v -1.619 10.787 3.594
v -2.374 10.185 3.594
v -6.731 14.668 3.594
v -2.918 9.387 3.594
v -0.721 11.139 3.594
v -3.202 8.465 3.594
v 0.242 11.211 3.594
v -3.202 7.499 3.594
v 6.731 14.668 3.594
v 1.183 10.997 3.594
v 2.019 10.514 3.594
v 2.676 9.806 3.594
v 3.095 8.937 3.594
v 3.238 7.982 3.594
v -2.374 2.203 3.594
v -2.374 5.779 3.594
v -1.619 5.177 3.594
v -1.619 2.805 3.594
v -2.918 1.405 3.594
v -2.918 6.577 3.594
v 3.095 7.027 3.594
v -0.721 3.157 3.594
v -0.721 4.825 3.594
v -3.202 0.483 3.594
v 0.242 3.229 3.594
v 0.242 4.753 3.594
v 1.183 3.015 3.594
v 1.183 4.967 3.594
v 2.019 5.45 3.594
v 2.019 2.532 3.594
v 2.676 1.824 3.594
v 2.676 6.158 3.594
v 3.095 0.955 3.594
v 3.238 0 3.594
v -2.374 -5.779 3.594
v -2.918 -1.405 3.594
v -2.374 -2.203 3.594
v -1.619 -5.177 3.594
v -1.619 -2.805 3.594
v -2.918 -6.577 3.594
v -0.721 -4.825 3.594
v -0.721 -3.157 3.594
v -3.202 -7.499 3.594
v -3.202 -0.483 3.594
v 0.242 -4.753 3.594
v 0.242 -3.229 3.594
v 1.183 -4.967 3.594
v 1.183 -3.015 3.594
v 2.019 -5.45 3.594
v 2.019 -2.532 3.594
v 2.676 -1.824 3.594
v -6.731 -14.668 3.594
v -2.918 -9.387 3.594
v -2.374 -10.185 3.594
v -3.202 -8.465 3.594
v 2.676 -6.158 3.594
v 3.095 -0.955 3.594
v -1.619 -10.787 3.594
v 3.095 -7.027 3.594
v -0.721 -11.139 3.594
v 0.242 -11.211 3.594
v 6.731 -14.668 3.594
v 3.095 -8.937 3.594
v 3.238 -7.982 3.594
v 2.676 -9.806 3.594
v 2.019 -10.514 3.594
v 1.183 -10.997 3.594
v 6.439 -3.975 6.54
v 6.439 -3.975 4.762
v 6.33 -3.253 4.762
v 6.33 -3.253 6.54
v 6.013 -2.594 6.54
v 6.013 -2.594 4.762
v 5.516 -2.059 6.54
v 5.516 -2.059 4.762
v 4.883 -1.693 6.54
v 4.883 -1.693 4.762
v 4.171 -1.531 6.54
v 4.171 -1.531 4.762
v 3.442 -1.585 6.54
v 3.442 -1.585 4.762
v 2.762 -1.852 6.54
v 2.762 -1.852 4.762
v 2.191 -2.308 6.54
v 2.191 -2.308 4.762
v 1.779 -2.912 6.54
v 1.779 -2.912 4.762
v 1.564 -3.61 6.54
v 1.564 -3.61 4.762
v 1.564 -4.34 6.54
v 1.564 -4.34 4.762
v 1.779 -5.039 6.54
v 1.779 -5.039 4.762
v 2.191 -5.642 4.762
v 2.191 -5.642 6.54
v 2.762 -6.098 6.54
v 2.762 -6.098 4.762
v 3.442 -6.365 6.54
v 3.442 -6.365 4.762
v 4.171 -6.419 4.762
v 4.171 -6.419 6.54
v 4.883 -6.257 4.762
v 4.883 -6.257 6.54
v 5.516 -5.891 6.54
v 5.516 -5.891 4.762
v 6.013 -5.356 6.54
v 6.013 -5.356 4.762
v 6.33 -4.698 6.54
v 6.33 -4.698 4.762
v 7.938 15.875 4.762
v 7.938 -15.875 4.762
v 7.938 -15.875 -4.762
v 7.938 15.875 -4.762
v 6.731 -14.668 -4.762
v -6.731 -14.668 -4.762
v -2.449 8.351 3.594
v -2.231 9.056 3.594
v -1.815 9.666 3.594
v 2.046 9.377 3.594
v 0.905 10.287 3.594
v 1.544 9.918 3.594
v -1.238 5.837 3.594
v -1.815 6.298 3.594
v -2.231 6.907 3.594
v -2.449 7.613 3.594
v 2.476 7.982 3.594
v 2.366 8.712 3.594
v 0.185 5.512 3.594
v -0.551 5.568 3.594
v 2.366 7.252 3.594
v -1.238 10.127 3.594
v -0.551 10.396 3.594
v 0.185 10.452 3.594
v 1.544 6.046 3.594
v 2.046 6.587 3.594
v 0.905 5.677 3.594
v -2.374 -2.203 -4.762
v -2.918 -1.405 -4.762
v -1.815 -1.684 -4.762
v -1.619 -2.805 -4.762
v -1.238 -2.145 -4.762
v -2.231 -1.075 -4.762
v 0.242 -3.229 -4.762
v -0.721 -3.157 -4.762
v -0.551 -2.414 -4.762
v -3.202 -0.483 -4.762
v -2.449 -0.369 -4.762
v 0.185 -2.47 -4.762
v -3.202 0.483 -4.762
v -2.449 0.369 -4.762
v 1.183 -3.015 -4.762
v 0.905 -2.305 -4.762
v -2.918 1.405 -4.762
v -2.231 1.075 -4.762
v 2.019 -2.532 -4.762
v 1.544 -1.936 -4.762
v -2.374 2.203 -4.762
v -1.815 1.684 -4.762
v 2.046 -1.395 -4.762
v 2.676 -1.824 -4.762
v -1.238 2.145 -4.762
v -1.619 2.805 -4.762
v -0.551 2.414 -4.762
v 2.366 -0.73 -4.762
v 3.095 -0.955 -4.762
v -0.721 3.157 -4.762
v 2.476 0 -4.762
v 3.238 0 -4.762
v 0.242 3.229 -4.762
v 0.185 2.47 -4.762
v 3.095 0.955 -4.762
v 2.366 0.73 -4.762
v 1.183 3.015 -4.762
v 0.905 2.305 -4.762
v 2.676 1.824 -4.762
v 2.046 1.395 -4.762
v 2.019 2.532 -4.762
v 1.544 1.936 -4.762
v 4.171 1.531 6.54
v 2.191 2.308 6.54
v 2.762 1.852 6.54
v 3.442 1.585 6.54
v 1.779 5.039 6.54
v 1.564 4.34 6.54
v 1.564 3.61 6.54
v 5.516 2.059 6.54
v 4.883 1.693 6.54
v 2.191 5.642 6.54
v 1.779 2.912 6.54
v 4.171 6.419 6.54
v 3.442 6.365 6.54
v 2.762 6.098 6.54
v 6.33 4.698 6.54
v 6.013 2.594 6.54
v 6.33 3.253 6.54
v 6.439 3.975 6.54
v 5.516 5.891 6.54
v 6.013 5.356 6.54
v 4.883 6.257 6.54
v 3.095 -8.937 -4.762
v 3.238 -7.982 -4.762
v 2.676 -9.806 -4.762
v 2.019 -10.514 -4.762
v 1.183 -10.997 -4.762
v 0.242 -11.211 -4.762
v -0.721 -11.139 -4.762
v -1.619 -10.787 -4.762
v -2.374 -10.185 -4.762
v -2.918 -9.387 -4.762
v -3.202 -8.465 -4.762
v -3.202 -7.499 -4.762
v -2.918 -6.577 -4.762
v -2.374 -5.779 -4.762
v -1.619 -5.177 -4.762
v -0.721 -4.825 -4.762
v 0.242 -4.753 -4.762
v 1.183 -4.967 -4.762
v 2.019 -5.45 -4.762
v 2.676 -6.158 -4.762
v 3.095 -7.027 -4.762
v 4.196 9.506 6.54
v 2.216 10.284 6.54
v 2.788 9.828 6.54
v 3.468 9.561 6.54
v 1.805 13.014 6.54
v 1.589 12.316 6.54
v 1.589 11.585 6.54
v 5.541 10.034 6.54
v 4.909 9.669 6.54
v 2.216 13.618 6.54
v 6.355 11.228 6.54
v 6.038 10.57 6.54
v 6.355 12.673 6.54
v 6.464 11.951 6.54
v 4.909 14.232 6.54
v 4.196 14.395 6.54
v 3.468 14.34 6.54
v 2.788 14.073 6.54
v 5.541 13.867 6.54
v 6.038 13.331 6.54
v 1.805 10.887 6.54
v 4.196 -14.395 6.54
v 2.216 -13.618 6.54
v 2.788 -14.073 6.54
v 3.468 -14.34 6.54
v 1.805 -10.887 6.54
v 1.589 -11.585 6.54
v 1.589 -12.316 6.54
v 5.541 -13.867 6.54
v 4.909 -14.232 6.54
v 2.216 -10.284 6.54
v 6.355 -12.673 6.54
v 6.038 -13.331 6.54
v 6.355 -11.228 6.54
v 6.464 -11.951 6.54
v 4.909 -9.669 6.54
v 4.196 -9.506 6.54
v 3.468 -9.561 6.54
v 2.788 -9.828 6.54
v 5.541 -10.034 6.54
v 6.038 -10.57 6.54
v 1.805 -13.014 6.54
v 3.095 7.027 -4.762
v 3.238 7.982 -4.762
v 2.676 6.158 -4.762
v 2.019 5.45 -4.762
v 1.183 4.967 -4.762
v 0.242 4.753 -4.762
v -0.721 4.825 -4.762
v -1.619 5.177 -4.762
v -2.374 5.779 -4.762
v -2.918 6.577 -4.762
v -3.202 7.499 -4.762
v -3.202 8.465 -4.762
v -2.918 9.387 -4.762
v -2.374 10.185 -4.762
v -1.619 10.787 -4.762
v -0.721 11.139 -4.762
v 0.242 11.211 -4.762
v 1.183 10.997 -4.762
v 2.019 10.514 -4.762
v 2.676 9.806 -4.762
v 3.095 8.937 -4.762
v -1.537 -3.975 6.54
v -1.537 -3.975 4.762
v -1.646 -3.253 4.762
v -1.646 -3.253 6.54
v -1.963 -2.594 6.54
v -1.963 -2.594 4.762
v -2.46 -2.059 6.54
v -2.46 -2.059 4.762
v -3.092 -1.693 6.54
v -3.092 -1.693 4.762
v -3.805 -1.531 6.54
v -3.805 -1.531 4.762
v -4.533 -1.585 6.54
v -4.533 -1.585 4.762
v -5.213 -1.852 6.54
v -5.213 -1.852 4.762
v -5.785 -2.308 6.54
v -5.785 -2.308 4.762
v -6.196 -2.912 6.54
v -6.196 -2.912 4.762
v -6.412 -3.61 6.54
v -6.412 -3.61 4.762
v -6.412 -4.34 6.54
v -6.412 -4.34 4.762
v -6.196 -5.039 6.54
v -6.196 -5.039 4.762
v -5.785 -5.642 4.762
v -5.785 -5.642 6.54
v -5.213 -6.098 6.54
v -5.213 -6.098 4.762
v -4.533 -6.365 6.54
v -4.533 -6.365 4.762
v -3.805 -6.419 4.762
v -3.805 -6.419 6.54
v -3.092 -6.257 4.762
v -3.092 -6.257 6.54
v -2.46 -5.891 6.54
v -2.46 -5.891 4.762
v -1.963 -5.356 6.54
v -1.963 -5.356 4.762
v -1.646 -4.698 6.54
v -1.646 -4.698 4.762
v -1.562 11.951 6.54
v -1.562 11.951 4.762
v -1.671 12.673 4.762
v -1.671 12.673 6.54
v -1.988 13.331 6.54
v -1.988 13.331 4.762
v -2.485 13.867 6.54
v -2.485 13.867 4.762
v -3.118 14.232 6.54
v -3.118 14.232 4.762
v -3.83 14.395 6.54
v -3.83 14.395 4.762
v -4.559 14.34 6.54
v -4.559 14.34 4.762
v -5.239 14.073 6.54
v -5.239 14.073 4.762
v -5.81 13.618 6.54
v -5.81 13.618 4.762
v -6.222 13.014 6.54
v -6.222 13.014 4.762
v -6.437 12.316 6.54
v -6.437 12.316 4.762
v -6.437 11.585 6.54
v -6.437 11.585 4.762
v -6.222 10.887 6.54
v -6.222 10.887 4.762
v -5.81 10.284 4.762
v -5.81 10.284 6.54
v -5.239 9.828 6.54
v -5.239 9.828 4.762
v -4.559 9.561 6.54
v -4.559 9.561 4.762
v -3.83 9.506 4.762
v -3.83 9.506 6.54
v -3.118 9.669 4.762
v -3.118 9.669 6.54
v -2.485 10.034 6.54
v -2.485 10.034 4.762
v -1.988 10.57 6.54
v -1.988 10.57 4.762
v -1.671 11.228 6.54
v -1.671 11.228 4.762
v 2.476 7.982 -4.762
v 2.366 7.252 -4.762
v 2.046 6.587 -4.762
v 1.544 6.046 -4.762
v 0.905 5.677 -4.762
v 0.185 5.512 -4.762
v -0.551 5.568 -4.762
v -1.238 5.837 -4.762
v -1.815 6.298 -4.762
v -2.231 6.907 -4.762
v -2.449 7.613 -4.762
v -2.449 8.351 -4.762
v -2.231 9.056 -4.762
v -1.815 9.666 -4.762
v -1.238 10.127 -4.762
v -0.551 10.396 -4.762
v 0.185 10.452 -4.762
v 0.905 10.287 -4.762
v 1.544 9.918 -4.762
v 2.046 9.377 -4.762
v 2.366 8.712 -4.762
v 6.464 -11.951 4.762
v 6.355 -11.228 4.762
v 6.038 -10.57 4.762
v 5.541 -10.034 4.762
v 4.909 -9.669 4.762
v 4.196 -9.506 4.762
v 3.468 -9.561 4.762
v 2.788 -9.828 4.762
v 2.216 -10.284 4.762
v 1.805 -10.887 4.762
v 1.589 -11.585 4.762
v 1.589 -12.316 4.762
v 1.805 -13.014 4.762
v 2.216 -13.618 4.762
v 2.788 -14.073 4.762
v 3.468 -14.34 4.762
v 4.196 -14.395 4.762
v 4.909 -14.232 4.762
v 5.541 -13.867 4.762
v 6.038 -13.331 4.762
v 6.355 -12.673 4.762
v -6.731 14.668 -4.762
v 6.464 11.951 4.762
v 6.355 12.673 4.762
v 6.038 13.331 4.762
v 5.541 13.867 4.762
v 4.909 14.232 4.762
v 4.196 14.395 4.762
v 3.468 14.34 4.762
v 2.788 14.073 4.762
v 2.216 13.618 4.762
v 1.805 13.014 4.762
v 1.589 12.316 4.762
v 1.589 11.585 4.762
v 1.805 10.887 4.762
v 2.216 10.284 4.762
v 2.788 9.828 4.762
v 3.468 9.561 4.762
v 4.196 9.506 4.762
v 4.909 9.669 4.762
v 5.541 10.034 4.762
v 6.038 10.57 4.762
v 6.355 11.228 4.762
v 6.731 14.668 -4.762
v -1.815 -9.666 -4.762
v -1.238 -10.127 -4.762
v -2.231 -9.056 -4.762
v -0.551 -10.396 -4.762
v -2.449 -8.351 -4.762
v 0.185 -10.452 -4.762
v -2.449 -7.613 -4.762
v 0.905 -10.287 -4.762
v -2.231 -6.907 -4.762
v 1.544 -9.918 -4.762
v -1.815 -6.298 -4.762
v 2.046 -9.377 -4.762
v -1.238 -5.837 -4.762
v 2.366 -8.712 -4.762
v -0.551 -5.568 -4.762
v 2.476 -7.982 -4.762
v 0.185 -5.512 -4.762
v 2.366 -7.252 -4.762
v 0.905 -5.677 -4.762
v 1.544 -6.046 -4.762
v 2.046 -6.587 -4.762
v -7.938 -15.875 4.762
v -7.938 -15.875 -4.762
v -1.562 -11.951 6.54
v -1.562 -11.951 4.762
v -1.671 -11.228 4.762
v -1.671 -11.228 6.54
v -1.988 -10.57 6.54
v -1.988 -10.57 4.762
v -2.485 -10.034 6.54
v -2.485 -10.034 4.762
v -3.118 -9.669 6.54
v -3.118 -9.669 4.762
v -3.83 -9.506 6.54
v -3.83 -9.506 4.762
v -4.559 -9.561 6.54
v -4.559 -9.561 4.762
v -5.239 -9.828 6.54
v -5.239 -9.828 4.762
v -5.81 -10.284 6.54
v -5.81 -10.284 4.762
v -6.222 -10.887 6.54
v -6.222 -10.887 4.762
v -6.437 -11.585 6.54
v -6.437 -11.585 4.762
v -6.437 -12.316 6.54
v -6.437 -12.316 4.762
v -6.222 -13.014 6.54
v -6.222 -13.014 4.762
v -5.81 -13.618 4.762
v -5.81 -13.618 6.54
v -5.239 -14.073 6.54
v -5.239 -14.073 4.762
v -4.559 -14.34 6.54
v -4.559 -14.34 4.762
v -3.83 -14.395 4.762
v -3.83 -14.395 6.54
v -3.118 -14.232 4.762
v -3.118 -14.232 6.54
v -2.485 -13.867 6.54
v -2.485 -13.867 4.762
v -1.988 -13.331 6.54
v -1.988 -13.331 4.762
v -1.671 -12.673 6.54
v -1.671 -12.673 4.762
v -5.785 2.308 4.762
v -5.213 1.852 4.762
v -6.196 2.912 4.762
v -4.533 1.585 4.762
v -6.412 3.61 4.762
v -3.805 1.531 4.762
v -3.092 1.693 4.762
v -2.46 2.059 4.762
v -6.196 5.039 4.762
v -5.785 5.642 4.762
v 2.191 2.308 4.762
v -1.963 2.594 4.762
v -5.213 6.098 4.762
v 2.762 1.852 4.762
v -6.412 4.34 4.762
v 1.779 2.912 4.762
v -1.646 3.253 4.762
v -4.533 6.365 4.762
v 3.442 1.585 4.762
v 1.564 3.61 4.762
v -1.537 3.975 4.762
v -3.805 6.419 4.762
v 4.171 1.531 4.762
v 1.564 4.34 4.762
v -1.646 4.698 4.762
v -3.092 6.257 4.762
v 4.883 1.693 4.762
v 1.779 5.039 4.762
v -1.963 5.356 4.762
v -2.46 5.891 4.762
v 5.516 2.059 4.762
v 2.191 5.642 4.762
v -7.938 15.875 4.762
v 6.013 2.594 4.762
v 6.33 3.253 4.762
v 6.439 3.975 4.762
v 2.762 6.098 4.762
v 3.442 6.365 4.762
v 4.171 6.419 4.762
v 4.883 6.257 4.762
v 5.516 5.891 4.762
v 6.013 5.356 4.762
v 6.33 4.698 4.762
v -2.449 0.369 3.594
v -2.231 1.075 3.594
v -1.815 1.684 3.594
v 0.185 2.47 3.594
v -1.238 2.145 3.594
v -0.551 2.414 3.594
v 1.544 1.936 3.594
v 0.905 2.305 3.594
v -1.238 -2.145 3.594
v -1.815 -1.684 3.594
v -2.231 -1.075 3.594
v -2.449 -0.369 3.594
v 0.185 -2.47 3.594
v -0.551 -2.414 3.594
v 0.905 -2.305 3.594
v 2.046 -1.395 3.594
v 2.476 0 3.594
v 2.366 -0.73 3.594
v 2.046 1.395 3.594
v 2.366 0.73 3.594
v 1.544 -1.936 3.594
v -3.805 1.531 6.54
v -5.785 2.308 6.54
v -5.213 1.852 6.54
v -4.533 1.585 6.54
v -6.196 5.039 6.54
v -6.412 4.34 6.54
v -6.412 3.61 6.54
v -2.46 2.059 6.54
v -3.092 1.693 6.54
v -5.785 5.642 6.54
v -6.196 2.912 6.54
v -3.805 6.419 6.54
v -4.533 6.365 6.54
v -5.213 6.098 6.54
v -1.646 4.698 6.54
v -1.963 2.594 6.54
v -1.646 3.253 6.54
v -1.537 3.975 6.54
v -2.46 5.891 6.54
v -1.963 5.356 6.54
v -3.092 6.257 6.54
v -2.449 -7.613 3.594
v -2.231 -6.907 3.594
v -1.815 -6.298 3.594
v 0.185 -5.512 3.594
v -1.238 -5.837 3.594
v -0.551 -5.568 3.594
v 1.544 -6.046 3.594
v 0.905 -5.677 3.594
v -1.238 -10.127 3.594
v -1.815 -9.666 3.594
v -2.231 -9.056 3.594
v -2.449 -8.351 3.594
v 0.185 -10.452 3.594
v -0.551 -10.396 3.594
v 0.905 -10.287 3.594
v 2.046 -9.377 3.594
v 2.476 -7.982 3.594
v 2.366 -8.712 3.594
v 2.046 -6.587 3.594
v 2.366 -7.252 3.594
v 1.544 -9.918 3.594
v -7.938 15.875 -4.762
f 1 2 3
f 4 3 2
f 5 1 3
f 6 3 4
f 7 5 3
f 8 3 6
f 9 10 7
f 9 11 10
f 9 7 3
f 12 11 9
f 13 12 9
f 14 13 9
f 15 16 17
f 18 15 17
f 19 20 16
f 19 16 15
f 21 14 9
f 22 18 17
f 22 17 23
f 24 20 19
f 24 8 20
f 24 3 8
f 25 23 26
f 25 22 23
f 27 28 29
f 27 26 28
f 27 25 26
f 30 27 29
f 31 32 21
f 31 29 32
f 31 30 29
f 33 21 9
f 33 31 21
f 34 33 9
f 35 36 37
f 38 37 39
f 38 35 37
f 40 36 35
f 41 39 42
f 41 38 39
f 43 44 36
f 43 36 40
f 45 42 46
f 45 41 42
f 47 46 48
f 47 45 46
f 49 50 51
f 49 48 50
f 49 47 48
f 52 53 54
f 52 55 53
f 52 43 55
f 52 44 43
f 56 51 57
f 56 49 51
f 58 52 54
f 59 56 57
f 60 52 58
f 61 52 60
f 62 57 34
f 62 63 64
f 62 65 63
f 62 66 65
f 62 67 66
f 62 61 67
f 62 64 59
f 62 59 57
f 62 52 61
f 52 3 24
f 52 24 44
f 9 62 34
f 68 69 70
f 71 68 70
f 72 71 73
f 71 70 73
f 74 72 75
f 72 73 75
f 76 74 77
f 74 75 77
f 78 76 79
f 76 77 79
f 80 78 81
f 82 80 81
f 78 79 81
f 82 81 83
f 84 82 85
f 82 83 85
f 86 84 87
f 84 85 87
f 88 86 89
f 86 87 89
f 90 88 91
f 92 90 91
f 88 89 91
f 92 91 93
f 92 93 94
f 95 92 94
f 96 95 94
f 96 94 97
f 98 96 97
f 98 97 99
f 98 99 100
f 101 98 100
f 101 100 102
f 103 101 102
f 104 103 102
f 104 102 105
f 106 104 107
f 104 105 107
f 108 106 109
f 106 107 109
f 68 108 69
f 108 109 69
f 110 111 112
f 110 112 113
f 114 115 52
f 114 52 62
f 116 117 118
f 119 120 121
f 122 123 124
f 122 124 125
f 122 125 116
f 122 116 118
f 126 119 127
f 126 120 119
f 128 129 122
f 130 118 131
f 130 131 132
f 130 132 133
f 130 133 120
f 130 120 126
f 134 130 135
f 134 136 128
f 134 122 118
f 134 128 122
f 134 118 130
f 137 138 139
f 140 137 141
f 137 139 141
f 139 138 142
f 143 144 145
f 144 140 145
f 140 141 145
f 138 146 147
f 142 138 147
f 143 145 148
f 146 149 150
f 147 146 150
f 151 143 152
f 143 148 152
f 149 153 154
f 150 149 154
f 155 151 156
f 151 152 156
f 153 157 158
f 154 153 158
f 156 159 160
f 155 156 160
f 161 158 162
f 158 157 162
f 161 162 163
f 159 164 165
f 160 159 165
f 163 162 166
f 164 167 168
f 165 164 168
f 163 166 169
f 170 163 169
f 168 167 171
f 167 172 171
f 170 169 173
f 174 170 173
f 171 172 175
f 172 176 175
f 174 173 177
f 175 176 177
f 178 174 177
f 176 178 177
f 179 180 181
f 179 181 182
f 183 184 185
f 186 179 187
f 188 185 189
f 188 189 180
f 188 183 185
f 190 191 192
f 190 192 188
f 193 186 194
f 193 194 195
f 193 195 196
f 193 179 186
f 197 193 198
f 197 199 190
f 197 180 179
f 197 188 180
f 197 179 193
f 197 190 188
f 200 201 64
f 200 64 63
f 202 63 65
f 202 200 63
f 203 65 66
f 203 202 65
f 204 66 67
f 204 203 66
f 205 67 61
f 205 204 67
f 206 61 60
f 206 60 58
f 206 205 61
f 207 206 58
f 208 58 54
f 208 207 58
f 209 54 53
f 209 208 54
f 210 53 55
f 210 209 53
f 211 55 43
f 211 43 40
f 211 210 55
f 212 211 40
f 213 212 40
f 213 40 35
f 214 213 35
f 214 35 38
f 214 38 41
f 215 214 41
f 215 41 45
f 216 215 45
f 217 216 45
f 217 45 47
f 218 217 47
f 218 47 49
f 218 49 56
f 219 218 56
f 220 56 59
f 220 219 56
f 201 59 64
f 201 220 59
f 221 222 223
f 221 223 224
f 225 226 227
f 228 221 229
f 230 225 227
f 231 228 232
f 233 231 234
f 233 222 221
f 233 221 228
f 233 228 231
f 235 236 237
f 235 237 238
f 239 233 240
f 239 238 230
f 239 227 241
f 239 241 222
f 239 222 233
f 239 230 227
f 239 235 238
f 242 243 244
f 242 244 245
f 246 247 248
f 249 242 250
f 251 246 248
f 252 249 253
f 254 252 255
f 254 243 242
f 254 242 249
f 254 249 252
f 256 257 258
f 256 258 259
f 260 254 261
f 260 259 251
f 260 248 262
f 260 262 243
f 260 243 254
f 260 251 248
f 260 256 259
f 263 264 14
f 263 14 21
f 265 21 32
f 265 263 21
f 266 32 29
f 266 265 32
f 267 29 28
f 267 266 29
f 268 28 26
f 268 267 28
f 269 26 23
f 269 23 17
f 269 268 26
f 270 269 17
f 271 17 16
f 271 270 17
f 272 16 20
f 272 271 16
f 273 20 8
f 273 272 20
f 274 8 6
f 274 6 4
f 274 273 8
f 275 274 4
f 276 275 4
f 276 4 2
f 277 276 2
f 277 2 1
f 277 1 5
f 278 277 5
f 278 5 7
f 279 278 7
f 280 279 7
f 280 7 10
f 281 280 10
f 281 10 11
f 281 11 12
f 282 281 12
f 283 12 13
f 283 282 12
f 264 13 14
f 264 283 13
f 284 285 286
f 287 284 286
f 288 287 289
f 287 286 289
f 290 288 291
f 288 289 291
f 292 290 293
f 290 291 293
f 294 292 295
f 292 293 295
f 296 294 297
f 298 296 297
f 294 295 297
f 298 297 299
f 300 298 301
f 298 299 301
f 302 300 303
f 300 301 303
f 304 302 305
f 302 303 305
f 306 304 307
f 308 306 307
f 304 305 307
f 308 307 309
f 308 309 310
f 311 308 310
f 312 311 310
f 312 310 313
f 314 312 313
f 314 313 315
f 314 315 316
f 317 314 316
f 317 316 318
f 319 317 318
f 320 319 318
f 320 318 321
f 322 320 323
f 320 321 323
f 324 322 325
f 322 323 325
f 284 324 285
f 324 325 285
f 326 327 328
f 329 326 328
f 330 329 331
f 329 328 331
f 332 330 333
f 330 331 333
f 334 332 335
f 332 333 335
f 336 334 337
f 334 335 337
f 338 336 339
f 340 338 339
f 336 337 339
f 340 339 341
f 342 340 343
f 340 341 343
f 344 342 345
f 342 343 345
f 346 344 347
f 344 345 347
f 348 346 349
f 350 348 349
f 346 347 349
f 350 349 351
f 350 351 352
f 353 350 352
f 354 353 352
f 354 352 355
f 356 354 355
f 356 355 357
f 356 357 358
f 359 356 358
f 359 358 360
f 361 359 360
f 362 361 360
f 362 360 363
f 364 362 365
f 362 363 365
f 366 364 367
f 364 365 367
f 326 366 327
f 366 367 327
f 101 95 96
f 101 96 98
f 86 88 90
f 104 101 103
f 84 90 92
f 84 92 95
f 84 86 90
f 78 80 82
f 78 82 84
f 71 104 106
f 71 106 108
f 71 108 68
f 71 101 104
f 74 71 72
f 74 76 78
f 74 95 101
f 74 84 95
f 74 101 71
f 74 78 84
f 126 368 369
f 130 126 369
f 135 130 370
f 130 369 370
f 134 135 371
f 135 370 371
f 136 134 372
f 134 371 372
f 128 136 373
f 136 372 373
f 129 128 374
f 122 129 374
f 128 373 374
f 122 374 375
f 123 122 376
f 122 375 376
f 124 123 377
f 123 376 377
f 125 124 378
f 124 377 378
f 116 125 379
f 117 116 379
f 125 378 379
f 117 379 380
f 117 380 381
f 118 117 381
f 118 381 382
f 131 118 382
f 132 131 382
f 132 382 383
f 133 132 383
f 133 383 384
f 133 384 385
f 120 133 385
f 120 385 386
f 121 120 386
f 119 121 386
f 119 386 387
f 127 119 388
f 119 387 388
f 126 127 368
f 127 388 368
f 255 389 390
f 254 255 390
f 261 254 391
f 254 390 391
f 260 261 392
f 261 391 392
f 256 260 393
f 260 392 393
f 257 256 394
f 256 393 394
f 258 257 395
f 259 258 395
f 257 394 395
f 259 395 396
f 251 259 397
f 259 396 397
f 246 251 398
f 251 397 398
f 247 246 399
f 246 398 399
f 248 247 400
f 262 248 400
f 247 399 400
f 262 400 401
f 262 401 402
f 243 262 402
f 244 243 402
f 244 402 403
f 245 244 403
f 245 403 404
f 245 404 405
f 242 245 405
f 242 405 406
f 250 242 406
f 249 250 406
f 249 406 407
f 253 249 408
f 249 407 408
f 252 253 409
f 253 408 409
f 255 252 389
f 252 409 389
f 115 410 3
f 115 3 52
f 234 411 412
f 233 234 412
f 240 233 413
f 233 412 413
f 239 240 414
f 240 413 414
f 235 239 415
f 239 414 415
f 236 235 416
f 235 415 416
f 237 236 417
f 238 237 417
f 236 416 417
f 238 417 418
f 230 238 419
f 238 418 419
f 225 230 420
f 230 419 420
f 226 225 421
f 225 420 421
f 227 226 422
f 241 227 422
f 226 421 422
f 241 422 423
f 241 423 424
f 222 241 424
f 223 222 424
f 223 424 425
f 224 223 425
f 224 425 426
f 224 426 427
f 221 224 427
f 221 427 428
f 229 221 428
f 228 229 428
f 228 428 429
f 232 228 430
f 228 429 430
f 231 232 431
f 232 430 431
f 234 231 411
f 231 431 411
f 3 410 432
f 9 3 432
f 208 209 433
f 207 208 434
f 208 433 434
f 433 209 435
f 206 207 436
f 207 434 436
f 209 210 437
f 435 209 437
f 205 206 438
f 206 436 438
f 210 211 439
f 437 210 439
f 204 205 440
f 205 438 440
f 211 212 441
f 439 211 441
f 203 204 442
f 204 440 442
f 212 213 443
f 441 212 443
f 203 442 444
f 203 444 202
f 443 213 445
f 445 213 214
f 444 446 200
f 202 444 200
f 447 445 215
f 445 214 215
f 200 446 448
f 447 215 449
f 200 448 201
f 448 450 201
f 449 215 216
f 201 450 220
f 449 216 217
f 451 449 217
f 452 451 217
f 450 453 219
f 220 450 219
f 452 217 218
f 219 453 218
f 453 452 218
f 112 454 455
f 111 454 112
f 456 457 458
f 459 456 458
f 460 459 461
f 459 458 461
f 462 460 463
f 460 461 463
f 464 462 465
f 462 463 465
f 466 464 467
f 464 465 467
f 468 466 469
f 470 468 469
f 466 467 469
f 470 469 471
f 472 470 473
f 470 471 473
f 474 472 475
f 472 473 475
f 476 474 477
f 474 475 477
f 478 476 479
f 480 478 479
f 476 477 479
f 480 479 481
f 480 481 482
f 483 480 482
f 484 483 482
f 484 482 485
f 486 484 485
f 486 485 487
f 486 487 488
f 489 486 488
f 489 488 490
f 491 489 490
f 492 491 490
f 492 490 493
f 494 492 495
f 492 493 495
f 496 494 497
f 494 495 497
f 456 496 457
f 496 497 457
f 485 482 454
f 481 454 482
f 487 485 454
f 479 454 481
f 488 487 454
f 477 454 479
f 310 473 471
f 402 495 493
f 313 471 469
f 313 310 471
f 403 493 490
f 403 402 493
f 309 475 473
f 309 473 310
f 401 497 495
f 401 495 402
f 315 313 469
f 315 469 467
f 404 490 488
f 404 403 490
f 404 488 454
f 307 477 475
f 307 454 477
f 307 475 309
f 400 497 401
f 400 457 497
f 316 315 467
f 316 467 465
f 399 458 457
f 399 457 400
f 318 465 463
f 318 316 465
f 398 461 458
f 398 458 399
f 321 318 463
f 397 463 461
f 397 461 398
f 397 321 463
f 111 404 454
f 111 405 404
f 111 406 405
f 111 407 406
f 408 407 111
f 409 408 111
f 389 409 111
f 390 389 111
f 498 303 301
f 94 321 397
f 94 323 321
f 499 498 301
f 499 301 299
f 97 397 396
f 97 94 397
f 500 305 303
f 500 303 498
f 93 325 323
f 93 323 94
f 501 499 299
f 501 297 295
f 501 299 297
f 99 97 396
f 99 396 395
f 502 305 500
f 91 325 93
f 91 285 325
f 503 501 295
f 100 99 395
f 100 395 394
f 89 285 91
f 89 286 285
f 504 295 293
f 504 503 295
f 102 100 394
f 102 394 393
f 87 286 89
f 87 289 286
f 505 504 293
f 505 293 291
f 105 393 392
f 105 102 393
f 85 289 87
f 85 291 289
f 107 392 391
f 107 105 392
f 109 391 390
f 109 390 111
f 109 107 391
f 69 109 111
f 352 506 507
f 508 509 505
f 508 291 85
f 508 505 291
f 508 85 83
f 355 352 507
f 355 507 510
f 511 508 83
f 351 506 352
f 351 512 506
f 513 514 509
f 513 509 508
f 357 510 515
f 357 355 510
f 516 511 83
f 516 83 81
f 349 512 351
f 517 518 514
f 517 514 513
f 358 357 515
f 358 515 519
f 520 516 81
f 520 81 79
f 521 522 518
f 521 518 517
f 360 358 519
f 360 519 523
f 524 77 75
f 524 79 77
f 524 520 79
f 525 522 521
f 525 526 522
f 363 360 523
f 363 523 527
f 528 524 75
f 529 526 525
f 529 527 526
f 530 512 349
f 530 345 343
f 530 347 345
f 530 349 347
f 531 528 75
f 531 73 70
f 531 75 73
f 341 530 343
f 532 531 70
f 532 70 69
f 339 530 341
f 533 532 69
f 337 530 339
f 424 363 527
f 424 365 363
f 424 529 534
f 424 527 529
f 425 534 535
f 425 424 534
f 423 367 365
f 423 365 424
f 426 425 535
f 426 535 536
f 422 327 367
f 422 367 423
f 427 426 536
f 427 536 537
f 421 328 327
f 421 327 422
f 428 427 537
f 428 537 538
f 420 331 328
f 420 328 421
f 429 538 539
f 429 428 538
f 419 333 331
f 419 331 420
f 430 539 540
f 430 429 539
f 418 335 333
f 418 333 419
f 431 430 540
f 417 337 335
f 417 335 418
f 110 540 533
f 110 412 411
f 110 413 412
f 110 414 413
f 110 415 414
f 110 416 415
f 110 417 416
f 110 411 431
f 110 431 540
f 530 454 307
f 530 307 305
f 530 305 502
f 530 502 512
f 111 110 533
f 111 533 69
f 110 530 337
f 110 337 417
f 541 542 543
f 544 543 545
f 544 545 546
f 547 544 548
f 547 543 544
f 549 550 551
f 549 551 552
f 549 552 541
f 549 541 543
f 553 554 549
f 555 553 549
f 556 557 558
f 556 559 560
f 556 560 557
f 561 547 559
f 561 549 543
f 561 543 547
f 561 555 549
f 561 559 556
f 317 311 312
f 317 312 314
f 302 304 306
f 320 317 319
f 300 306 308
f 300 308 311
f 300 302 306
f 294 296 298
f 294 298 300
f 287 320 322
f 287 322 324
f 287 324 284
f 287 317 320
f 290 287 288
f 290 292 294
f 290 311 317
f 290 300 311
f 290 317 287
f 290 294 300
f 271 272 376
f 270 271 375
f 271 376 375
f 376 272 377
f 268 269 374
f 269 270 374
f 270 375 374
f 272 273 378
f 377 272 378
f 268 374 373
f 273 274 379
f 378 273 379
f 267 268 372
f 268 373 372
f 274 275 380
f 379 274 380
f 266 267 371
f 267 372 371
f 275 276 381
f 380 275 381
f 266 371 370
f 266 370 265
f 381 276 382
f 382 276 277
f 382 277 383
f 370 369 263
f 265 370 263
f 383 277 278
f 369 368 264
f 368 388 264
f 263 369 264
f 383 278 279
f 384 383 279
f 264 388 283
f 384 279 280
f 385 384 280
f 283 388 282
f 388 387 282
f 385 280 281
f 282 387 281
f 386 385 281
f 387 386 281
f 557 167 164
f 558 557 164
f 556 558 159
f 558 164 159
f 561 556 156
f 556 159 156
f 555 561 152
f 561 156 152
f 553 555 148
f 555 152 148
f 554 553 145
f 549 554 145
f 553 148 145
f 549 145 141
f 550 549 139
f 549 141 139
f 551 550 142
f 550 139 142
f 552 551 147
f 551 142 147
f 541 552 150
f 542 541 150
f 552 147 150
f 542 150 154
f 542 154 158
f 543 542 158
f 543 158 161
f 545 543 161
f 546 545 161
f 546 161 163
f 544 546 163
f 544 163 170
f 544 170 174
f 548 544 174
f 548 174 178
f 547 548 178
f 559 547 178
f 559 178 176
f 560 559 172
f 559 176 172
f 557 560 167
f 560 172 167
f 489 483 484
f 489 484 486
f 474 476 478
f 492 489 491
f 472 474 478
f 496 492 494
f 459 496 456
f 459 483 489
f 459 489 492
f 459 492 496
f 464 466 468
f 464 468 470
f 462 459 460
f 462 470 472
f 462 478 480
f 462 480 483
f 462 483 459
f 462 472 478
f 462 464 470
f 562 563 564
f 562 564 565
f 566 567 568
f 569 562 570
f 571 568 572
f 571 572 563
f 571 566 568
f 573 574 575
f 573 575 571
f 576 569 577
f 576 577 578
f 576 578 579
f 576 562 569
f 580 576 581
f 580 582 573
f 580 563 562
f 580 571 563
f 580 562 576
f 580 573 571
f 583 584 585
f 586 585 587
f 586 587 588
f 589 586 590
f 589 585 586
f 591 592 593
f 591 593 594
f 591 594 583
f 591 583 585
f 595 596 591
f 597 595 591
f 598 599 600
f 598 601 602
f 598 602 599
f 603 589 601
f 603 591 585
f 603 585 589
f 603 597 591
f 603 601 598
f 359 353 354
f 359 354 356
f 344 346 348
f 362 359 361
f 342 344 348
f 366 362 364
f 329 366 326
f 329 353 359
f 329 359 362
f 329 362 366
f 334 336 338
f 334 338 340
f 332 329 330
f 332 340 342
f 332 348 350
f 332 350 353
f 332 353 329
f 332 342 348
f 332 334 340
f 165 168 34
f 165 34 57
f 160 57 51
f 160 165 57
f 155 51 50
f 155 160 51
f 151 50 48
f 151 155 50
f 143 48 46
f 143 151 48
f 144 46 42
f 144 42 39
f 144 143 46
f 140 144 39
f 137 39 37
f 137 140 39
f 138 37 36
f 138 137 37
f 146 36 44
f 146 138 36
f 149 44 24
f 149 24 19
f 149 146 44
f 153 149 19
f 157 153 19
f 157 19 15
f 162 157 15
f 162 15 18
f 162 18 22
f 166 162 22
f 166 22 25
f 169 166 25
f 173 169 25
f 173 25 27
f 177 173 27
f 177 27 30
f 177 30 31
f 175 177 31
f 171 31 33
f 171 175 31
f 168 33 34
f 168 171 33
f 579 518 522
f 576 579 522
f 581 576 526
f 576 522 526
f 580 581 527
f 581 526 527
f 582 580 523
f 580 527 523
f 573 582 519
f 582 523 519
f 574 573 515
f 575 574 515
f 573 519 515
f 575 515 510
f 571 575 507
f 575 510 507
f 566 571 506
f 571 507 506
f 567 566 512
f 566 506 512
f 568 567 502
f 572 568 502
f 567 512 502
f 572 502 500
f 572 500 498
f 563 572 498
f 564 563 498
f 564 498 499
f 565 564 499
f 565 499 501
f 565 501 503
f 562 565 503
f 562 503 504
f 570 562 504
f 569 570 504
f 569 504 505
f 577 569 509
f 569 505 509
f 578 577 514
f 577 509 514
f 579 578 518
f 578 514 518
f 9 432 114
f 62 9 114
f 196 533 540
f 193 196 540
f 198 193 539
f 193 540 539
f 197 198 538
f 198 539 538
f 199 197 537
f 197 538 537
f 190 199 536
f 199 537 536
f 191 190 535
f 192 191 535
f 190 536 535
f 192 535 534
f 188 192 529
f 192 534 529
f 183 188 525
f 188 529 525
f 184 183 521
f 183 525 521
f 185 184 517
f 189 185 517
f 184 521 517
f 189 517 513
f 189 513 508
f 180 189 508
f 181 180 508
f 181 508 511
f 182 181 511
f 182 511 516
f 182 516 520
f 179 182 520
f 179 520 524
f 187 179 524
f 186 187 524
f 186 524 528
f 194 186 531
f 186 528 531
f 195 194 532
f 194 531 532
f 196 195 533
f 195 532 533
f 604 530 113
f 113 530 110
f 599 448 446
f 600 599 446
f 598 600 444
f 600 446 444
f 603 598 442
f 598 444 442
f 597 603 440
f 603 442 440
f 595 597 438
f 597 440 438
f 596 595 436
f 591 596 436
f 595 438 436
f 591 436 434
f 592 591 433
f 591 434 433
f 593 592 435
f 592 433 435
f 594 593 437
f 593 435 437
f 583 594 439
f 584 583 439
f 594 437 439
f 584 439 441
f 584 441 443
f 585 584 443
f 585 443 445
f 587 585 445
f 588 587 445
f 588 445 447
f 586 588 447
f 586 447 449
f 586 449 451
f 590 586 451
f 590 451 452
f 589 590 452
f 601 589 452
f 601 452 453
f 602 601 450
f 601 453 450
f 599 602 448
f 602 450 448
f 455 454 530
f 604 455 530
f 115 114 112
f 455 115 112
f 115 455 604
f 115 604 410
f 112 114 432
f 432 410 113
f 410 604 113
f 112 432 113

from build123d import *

# Parameters (mm, degrees)
F0_W     = 15.875
F0_H     = 31.75
F1_DEPTH = 4.7625
F2_R     = 2.4511
F3_DEPTH = 1.778
F4_W     = 13.462
F4_H     = 29.337
F4_R     = 3.2385
F5_DEPTH = 8.3566
F6_R     = 2.4765
F7_R     = 2.4765
F8_R     = 2.4765
F9_DEPTH = 8.3566


with BuildPart() as f1:
    # F0 (on Top) → F1 (new body, symmetric)
    with BuildSketch(Plane.XY):
        Rectangle(F0_W, F0_H)
    extrude(amount=F1_DEPTH, both=True)

    # F2 (on face) → F3 (join)
    with BuildSketch(Plane.XY.offset(4.7625)):
        with Locations((4.0132, 11.9507)):
            Circle(F2_R)
        with Locations((3.9878, 3.97514)):
            Circle(F2_R)
        with Locations((3.9878, -3.97506)):
            Circle(F2_R)
        with Locations((4.0132, -11.9507)):
            Circle(F2_R)
        with Locations((-4.0132, -11.9507)):
            Circle(F2_R)
        with Locations((-3.9878, -3.97506)):
            Circle(F2_R)
        with Locations((-3.9878, 3.97514)):
            Circle(F2_R)
        with Locations((-4.0132, 11.9507)):
            Circle(F2_R)
    extrude(amount=F3_DEPTH)

    # F4 (on face) → F5 (cut)
    with BuildSketch(Plane(origin=(0, 0, -4.7625), x_dir=(1, 0, 0), z_dir=(0, 0, -1))):
        Rectangle(F4_W, F4_H)
        with Locations((0, -7.98195)):
            Circle(F4_R, mode=Mode.SUBTRACT)
        Circle(F4_R, mode=Mode.SUBTRACT)
        with Locations((0, 7.98195)):
            Circle(F4_R, mode=Mode.SUBTRACT)
    extrude(amount=-F5_DEPTH, mode=Mode.SUBTRACT)

    # F6 (on face) + F7 (on face) + F8 (on face) → F9 (cut)
    with BuildSketch(Plane(origin=(0, 0, -4.7625), x_dir=(1, 0, 0), z_dir=(0, 0, -1))):
        Circle(F6_R)
    with BuildSketch(Plane(origin=(0, 0, -4.7625), x_dir=(1, 0, 0), z_dir=(0, 0, -1))):
        with Locations((0, 7.98195)):
            Circle(F7_R)
    with BuildSketch(Plane(origin=(0, 0, -4.7625), x_dir=(1, 0, 0), z_dir=(0, 0, -1))):
        with Locations((0, -7.98195)):
            Circle(F8_R)
    extrude(amount=-F9_DEPTH, mode=Mode.SUBTRACT)


solid = f1.part
